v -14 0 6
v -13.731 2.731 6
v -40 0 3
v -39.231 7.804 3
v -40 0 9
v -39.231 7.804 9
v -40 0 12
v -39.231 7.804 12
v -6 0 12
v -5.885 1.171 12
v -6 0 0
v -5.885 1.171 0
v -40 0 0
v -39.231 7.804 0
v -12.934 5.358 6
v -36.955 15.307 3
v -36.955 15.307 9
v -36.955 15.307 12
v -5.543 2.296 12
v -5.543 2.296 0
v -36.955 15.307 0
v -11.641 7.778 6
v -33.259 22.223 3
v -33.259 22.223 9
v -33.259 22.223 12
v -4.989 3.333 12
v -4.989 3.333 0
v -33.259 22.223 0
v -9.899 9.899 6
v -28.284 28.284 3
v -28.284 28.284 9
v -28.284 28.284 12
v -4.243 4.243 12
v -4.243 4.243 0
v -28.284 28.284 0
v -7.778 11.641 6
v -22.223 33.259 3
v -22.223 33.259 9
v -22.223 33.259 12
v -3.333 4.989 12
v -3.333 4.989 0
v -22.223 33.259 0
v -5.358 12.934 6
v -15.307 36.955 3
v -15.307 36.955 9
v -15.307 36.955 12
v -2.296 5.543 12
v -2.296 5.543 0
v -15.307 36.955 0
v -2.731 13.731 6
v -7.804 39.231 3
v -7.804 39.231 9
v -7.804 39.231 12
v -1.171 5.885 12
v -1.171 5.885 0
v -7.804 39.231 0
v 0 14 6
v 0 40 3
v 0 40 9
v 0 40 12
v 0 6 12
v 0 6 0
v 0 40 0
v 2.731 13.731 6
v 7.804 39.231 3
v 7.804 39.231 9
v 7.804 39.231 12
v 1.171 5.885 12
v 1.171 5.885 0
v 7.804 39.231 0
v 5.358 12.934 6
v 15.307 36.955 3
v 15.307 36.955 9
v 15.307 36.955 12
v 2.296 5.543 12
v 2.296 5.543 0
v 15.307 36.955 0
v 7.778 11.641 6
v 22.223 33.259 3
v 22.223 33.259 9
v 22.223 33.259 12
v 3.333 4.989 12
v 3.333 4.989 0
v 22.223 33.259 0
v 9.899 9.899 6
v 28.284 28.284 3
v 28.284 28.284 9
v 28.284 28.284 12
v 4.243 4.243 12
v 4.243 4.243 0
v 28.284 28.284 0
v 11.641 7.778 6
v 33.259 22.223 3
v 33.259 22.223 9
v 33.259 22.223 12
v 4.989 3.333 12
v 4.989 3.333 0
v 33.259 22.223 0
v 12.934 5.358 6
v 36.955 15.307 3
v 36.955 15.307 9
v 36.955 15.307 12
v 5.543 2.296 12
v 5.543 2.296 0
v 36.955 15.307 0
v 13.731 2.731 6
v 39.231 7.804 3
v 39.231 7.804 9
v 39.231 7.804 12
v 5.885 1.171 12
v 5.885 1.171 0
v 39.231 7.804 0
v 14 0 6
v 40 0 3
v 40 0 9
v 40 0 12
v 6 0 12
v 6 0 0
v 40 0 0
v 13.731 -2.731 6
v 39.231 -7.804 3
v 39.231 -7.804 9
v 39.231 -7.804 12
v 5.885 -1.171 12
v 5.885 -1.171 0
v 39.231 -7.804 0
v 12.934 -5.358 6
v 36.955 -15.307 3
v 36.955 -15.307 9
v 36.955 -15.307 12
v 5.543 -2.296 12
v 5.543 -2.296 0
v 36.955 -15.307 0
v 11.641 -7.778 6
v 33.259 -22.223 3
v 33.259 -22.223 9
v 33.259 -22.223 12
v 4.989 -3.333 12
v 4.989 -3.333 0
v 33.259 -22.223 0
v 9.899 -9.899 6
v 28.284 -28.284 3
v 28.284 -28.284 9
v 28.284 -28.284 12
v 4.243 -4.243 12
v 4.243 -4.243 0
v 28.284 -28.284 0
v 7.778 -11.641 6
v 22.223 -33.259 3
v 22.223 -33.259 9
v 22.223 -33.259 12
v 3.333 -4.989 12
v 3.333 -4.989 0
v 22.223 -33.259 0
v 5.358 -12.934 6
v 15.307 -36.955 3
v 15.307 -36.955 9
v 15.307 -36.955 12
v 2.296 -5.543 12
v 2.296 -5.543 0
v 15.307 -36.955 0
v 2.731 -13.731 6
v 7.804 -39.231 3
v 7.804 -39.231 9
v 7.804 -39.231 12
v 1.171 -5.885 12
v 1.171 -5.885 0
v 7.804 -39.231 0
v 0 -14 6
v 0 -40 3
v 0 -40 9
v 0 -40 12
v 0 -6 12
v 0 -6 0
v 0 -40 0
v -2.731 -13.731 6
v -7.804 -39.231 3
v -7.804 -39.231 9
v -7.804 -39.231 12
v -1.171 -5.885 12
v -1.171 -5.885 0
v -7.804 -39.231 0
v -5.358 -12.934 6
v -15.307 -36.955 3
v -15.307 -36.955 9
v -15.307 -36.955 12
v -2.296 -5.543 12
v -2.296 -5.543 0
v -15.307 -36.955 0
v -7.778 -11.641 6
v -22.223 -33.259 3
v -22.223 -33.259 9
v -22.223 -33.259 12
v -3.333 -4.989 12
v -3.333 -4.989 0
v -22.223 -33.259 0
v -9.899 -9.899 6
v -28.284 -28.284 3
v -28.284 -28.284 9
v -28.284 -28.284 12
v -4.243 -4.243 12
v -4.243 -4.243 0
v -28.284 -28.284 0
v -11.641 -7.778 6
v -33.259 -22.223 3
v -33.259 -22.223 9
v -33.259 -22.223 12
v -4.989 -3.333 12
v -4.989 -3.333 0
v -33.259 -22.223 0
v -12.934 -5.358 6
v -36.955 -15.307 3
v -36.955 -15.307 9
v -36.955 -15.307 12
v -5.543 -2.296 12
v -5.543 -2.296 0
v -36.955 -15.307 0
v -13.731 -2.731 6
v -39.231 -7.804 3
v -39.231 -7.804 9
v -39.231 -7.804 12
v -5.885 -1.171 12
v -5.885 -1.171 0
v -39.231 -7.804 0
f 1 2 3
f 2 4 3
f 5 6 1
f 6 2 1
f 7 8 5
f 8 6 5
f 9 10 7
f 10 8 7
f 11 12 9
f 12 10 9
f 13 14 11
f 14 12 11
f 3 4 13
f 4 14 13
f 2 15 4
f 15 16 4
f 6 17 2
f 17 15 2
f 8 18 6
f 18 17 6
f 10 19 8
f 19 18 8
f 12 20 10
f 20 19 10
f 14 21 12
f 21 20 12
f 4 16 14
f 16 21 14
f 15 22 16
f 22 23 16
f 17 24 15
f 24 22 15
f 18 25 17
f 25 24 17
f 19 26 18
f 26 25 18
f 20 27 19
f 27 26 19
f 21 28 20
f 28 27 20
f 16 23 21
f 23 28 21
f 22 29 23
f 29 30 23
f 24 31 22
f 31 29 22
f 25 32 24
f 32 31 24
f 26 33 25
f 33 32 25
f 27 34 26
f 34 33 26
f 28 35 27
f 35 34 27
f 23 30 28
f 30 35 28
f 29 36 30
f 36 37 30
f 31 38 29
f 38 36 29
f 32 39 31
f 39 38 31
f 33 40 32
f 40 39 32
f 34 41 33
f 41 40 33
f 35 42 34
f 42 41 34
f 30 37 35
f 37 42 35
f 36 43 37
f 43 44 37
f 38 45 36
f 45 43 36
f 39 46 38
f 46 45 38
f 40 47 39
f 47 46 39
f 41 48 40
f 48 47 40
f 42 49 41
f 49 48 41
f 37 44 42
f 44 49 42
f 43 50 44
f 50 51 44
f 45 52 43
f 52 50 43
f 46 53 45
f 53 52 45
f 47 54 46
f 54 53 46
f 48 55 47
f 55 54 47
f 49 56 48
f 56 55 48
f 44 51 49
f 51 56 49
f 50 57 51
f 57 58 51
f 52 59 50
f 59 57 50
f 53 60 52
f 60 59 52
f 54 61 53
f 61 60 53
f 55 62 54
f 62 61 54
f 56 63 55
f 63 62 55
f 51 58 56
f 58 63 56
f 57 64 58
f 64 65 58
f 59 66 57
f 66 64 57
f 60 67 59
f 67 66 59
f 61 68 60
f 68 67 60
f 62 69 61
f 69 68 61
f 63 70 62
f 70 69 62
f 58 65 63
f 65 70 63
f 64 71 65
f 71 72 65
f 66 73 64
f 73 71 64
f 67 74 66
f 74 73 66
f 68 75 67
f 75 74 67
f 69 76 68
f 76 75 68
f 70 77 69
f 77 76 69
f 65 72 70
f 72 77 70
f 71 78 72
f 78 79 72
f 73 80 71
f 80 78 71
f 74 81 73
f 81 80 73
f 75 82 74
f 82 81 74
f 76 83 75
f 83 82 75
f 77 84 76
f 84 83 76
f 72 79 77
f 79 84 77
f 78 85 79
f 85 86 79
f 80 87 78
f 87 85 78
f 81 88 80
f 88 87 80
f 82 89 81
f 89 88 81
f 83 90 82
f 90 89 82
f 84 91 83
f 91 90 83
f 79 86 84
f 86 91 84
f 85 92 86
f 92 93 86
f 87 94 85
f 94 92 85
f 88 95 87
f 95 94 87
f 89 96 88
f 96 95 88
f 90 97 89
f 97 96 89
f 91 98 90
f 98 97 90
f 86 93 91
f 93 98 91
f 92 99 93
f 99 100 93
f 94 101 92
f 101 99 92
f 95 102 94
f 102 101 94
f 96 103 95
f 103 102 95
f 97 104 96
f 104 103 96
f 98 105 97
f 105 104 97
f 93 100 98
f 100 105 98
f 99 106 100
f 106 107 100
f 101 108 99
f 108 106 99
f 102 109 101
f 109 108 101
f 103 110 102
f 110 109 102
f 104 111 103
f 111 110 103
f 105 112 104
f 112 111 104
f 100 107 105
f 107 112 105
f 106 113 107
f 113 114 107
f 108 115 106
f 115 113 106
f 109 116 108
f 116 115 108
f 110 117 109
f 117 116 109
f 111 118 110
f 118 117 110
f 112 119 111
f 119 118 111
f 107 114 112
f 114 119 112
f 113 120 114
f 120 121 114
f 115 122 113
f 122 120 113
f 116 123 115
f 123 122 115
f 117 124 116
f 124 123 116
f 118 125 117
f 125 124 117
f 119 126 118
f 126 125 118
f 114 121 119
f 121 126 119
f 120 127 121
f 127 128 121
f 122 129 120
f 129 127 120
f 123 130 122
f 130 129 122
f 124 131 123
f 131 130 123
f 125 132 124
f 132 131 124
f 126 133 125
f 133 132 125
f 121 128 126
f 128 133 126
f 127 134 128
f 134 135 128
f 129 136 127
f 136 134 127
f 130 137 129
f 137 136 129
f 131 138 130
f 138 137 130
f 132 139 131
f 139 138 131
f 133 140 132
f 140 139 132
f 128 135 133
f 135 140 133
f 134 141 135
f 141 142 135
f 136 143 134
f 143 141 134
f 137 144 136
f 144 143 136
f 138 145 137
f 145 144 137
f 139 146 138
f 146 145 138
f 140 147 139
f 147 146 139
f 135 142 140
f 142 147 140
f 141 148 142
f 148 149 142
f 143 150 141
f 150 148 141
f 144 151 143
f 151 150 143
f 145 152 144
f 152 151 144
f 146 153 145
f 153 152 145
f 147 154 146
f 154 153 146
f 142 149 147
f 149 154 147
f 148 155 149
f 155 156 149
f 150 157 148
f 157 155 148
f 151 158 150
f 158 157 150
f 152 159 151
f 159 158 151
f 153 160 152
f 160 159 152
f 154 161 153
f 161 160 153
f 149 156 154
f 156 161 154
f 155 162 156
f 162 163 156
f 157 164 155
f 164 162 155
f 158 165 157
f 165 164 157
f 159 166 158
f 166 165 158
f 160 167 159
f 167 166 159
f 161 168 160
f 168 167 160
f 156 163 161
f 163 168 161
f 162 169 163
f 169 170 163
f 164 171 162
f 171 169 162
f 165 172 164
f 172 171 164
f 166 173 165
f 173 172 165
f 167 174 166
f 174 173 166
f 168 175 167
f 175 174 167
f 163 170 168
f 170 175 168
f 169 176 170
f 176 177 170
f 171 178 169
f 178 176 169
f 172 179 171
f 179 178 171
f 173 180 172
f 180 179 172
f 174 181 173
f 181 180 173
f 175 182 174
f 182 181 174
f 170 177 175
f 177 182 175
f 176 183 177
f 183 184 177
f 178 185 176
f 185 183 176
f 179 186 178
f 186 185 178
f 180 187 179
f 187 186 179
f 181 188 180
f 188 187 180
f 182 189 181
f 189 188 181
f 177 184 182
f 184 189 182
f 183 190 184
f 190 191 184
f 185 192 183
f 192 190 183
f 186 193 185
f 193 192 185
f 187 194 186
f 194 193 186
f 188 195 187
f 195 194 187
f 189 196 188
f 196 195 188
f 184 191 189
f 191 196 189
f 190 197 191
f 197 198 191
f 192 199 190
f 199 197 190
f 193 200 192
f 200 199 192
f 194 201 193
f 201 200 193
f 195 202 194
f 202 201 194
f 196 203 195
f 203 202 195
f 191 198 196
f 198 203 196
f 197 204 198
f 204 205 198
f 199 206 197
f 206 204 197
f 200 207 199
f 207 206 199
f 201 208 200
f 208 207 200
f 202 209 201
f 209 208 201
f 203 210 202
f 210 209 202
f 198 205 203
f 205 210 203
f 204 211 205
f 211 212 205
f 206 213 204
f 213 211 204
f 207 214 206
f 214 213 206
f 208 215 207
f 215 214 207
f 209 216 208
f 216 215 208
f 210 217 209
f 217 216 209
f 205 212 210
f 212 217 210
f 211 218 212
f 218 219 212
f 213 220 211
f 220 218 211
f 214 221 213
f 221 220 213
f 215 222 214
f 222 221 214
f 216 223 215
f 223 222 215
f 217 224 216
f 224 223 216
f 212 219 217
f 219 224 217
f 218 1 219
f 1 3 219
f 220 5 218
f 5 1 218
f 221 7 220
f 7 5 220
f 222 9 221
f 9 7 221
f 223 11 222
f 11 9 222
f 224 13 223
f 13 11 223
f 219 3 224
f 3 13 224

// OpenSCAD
$fn = 32;

// ----------------------------------------------------------------------
// Revolved part: V-groove pulley R40
// ----------------------------------------------------------------------

// --- parameters (mm) ---
bore_r = 6;               // bore radius
rim_r = 40;               // rim radius
rim_t = 12;               // rim width
groove_r = 14;            // groove root radius
groove_w = 3;             // groove half width
revolve_angle = 360;      // revolve sweep, degrees

bore_d = 2 * bore_r;
rim_d = 2 * rim_r;
groove_d = 2 * groove_r;

profile = [[6, 0], [40, 0], [40, 3], [14, 6], [40, 9], [40, 12], [6, 12]];  // primary outline, 7 points, counter clockwise

// --- the one profile operation ---
rotate_extrude(angle = revolve_angle) polygon(points = profile);
